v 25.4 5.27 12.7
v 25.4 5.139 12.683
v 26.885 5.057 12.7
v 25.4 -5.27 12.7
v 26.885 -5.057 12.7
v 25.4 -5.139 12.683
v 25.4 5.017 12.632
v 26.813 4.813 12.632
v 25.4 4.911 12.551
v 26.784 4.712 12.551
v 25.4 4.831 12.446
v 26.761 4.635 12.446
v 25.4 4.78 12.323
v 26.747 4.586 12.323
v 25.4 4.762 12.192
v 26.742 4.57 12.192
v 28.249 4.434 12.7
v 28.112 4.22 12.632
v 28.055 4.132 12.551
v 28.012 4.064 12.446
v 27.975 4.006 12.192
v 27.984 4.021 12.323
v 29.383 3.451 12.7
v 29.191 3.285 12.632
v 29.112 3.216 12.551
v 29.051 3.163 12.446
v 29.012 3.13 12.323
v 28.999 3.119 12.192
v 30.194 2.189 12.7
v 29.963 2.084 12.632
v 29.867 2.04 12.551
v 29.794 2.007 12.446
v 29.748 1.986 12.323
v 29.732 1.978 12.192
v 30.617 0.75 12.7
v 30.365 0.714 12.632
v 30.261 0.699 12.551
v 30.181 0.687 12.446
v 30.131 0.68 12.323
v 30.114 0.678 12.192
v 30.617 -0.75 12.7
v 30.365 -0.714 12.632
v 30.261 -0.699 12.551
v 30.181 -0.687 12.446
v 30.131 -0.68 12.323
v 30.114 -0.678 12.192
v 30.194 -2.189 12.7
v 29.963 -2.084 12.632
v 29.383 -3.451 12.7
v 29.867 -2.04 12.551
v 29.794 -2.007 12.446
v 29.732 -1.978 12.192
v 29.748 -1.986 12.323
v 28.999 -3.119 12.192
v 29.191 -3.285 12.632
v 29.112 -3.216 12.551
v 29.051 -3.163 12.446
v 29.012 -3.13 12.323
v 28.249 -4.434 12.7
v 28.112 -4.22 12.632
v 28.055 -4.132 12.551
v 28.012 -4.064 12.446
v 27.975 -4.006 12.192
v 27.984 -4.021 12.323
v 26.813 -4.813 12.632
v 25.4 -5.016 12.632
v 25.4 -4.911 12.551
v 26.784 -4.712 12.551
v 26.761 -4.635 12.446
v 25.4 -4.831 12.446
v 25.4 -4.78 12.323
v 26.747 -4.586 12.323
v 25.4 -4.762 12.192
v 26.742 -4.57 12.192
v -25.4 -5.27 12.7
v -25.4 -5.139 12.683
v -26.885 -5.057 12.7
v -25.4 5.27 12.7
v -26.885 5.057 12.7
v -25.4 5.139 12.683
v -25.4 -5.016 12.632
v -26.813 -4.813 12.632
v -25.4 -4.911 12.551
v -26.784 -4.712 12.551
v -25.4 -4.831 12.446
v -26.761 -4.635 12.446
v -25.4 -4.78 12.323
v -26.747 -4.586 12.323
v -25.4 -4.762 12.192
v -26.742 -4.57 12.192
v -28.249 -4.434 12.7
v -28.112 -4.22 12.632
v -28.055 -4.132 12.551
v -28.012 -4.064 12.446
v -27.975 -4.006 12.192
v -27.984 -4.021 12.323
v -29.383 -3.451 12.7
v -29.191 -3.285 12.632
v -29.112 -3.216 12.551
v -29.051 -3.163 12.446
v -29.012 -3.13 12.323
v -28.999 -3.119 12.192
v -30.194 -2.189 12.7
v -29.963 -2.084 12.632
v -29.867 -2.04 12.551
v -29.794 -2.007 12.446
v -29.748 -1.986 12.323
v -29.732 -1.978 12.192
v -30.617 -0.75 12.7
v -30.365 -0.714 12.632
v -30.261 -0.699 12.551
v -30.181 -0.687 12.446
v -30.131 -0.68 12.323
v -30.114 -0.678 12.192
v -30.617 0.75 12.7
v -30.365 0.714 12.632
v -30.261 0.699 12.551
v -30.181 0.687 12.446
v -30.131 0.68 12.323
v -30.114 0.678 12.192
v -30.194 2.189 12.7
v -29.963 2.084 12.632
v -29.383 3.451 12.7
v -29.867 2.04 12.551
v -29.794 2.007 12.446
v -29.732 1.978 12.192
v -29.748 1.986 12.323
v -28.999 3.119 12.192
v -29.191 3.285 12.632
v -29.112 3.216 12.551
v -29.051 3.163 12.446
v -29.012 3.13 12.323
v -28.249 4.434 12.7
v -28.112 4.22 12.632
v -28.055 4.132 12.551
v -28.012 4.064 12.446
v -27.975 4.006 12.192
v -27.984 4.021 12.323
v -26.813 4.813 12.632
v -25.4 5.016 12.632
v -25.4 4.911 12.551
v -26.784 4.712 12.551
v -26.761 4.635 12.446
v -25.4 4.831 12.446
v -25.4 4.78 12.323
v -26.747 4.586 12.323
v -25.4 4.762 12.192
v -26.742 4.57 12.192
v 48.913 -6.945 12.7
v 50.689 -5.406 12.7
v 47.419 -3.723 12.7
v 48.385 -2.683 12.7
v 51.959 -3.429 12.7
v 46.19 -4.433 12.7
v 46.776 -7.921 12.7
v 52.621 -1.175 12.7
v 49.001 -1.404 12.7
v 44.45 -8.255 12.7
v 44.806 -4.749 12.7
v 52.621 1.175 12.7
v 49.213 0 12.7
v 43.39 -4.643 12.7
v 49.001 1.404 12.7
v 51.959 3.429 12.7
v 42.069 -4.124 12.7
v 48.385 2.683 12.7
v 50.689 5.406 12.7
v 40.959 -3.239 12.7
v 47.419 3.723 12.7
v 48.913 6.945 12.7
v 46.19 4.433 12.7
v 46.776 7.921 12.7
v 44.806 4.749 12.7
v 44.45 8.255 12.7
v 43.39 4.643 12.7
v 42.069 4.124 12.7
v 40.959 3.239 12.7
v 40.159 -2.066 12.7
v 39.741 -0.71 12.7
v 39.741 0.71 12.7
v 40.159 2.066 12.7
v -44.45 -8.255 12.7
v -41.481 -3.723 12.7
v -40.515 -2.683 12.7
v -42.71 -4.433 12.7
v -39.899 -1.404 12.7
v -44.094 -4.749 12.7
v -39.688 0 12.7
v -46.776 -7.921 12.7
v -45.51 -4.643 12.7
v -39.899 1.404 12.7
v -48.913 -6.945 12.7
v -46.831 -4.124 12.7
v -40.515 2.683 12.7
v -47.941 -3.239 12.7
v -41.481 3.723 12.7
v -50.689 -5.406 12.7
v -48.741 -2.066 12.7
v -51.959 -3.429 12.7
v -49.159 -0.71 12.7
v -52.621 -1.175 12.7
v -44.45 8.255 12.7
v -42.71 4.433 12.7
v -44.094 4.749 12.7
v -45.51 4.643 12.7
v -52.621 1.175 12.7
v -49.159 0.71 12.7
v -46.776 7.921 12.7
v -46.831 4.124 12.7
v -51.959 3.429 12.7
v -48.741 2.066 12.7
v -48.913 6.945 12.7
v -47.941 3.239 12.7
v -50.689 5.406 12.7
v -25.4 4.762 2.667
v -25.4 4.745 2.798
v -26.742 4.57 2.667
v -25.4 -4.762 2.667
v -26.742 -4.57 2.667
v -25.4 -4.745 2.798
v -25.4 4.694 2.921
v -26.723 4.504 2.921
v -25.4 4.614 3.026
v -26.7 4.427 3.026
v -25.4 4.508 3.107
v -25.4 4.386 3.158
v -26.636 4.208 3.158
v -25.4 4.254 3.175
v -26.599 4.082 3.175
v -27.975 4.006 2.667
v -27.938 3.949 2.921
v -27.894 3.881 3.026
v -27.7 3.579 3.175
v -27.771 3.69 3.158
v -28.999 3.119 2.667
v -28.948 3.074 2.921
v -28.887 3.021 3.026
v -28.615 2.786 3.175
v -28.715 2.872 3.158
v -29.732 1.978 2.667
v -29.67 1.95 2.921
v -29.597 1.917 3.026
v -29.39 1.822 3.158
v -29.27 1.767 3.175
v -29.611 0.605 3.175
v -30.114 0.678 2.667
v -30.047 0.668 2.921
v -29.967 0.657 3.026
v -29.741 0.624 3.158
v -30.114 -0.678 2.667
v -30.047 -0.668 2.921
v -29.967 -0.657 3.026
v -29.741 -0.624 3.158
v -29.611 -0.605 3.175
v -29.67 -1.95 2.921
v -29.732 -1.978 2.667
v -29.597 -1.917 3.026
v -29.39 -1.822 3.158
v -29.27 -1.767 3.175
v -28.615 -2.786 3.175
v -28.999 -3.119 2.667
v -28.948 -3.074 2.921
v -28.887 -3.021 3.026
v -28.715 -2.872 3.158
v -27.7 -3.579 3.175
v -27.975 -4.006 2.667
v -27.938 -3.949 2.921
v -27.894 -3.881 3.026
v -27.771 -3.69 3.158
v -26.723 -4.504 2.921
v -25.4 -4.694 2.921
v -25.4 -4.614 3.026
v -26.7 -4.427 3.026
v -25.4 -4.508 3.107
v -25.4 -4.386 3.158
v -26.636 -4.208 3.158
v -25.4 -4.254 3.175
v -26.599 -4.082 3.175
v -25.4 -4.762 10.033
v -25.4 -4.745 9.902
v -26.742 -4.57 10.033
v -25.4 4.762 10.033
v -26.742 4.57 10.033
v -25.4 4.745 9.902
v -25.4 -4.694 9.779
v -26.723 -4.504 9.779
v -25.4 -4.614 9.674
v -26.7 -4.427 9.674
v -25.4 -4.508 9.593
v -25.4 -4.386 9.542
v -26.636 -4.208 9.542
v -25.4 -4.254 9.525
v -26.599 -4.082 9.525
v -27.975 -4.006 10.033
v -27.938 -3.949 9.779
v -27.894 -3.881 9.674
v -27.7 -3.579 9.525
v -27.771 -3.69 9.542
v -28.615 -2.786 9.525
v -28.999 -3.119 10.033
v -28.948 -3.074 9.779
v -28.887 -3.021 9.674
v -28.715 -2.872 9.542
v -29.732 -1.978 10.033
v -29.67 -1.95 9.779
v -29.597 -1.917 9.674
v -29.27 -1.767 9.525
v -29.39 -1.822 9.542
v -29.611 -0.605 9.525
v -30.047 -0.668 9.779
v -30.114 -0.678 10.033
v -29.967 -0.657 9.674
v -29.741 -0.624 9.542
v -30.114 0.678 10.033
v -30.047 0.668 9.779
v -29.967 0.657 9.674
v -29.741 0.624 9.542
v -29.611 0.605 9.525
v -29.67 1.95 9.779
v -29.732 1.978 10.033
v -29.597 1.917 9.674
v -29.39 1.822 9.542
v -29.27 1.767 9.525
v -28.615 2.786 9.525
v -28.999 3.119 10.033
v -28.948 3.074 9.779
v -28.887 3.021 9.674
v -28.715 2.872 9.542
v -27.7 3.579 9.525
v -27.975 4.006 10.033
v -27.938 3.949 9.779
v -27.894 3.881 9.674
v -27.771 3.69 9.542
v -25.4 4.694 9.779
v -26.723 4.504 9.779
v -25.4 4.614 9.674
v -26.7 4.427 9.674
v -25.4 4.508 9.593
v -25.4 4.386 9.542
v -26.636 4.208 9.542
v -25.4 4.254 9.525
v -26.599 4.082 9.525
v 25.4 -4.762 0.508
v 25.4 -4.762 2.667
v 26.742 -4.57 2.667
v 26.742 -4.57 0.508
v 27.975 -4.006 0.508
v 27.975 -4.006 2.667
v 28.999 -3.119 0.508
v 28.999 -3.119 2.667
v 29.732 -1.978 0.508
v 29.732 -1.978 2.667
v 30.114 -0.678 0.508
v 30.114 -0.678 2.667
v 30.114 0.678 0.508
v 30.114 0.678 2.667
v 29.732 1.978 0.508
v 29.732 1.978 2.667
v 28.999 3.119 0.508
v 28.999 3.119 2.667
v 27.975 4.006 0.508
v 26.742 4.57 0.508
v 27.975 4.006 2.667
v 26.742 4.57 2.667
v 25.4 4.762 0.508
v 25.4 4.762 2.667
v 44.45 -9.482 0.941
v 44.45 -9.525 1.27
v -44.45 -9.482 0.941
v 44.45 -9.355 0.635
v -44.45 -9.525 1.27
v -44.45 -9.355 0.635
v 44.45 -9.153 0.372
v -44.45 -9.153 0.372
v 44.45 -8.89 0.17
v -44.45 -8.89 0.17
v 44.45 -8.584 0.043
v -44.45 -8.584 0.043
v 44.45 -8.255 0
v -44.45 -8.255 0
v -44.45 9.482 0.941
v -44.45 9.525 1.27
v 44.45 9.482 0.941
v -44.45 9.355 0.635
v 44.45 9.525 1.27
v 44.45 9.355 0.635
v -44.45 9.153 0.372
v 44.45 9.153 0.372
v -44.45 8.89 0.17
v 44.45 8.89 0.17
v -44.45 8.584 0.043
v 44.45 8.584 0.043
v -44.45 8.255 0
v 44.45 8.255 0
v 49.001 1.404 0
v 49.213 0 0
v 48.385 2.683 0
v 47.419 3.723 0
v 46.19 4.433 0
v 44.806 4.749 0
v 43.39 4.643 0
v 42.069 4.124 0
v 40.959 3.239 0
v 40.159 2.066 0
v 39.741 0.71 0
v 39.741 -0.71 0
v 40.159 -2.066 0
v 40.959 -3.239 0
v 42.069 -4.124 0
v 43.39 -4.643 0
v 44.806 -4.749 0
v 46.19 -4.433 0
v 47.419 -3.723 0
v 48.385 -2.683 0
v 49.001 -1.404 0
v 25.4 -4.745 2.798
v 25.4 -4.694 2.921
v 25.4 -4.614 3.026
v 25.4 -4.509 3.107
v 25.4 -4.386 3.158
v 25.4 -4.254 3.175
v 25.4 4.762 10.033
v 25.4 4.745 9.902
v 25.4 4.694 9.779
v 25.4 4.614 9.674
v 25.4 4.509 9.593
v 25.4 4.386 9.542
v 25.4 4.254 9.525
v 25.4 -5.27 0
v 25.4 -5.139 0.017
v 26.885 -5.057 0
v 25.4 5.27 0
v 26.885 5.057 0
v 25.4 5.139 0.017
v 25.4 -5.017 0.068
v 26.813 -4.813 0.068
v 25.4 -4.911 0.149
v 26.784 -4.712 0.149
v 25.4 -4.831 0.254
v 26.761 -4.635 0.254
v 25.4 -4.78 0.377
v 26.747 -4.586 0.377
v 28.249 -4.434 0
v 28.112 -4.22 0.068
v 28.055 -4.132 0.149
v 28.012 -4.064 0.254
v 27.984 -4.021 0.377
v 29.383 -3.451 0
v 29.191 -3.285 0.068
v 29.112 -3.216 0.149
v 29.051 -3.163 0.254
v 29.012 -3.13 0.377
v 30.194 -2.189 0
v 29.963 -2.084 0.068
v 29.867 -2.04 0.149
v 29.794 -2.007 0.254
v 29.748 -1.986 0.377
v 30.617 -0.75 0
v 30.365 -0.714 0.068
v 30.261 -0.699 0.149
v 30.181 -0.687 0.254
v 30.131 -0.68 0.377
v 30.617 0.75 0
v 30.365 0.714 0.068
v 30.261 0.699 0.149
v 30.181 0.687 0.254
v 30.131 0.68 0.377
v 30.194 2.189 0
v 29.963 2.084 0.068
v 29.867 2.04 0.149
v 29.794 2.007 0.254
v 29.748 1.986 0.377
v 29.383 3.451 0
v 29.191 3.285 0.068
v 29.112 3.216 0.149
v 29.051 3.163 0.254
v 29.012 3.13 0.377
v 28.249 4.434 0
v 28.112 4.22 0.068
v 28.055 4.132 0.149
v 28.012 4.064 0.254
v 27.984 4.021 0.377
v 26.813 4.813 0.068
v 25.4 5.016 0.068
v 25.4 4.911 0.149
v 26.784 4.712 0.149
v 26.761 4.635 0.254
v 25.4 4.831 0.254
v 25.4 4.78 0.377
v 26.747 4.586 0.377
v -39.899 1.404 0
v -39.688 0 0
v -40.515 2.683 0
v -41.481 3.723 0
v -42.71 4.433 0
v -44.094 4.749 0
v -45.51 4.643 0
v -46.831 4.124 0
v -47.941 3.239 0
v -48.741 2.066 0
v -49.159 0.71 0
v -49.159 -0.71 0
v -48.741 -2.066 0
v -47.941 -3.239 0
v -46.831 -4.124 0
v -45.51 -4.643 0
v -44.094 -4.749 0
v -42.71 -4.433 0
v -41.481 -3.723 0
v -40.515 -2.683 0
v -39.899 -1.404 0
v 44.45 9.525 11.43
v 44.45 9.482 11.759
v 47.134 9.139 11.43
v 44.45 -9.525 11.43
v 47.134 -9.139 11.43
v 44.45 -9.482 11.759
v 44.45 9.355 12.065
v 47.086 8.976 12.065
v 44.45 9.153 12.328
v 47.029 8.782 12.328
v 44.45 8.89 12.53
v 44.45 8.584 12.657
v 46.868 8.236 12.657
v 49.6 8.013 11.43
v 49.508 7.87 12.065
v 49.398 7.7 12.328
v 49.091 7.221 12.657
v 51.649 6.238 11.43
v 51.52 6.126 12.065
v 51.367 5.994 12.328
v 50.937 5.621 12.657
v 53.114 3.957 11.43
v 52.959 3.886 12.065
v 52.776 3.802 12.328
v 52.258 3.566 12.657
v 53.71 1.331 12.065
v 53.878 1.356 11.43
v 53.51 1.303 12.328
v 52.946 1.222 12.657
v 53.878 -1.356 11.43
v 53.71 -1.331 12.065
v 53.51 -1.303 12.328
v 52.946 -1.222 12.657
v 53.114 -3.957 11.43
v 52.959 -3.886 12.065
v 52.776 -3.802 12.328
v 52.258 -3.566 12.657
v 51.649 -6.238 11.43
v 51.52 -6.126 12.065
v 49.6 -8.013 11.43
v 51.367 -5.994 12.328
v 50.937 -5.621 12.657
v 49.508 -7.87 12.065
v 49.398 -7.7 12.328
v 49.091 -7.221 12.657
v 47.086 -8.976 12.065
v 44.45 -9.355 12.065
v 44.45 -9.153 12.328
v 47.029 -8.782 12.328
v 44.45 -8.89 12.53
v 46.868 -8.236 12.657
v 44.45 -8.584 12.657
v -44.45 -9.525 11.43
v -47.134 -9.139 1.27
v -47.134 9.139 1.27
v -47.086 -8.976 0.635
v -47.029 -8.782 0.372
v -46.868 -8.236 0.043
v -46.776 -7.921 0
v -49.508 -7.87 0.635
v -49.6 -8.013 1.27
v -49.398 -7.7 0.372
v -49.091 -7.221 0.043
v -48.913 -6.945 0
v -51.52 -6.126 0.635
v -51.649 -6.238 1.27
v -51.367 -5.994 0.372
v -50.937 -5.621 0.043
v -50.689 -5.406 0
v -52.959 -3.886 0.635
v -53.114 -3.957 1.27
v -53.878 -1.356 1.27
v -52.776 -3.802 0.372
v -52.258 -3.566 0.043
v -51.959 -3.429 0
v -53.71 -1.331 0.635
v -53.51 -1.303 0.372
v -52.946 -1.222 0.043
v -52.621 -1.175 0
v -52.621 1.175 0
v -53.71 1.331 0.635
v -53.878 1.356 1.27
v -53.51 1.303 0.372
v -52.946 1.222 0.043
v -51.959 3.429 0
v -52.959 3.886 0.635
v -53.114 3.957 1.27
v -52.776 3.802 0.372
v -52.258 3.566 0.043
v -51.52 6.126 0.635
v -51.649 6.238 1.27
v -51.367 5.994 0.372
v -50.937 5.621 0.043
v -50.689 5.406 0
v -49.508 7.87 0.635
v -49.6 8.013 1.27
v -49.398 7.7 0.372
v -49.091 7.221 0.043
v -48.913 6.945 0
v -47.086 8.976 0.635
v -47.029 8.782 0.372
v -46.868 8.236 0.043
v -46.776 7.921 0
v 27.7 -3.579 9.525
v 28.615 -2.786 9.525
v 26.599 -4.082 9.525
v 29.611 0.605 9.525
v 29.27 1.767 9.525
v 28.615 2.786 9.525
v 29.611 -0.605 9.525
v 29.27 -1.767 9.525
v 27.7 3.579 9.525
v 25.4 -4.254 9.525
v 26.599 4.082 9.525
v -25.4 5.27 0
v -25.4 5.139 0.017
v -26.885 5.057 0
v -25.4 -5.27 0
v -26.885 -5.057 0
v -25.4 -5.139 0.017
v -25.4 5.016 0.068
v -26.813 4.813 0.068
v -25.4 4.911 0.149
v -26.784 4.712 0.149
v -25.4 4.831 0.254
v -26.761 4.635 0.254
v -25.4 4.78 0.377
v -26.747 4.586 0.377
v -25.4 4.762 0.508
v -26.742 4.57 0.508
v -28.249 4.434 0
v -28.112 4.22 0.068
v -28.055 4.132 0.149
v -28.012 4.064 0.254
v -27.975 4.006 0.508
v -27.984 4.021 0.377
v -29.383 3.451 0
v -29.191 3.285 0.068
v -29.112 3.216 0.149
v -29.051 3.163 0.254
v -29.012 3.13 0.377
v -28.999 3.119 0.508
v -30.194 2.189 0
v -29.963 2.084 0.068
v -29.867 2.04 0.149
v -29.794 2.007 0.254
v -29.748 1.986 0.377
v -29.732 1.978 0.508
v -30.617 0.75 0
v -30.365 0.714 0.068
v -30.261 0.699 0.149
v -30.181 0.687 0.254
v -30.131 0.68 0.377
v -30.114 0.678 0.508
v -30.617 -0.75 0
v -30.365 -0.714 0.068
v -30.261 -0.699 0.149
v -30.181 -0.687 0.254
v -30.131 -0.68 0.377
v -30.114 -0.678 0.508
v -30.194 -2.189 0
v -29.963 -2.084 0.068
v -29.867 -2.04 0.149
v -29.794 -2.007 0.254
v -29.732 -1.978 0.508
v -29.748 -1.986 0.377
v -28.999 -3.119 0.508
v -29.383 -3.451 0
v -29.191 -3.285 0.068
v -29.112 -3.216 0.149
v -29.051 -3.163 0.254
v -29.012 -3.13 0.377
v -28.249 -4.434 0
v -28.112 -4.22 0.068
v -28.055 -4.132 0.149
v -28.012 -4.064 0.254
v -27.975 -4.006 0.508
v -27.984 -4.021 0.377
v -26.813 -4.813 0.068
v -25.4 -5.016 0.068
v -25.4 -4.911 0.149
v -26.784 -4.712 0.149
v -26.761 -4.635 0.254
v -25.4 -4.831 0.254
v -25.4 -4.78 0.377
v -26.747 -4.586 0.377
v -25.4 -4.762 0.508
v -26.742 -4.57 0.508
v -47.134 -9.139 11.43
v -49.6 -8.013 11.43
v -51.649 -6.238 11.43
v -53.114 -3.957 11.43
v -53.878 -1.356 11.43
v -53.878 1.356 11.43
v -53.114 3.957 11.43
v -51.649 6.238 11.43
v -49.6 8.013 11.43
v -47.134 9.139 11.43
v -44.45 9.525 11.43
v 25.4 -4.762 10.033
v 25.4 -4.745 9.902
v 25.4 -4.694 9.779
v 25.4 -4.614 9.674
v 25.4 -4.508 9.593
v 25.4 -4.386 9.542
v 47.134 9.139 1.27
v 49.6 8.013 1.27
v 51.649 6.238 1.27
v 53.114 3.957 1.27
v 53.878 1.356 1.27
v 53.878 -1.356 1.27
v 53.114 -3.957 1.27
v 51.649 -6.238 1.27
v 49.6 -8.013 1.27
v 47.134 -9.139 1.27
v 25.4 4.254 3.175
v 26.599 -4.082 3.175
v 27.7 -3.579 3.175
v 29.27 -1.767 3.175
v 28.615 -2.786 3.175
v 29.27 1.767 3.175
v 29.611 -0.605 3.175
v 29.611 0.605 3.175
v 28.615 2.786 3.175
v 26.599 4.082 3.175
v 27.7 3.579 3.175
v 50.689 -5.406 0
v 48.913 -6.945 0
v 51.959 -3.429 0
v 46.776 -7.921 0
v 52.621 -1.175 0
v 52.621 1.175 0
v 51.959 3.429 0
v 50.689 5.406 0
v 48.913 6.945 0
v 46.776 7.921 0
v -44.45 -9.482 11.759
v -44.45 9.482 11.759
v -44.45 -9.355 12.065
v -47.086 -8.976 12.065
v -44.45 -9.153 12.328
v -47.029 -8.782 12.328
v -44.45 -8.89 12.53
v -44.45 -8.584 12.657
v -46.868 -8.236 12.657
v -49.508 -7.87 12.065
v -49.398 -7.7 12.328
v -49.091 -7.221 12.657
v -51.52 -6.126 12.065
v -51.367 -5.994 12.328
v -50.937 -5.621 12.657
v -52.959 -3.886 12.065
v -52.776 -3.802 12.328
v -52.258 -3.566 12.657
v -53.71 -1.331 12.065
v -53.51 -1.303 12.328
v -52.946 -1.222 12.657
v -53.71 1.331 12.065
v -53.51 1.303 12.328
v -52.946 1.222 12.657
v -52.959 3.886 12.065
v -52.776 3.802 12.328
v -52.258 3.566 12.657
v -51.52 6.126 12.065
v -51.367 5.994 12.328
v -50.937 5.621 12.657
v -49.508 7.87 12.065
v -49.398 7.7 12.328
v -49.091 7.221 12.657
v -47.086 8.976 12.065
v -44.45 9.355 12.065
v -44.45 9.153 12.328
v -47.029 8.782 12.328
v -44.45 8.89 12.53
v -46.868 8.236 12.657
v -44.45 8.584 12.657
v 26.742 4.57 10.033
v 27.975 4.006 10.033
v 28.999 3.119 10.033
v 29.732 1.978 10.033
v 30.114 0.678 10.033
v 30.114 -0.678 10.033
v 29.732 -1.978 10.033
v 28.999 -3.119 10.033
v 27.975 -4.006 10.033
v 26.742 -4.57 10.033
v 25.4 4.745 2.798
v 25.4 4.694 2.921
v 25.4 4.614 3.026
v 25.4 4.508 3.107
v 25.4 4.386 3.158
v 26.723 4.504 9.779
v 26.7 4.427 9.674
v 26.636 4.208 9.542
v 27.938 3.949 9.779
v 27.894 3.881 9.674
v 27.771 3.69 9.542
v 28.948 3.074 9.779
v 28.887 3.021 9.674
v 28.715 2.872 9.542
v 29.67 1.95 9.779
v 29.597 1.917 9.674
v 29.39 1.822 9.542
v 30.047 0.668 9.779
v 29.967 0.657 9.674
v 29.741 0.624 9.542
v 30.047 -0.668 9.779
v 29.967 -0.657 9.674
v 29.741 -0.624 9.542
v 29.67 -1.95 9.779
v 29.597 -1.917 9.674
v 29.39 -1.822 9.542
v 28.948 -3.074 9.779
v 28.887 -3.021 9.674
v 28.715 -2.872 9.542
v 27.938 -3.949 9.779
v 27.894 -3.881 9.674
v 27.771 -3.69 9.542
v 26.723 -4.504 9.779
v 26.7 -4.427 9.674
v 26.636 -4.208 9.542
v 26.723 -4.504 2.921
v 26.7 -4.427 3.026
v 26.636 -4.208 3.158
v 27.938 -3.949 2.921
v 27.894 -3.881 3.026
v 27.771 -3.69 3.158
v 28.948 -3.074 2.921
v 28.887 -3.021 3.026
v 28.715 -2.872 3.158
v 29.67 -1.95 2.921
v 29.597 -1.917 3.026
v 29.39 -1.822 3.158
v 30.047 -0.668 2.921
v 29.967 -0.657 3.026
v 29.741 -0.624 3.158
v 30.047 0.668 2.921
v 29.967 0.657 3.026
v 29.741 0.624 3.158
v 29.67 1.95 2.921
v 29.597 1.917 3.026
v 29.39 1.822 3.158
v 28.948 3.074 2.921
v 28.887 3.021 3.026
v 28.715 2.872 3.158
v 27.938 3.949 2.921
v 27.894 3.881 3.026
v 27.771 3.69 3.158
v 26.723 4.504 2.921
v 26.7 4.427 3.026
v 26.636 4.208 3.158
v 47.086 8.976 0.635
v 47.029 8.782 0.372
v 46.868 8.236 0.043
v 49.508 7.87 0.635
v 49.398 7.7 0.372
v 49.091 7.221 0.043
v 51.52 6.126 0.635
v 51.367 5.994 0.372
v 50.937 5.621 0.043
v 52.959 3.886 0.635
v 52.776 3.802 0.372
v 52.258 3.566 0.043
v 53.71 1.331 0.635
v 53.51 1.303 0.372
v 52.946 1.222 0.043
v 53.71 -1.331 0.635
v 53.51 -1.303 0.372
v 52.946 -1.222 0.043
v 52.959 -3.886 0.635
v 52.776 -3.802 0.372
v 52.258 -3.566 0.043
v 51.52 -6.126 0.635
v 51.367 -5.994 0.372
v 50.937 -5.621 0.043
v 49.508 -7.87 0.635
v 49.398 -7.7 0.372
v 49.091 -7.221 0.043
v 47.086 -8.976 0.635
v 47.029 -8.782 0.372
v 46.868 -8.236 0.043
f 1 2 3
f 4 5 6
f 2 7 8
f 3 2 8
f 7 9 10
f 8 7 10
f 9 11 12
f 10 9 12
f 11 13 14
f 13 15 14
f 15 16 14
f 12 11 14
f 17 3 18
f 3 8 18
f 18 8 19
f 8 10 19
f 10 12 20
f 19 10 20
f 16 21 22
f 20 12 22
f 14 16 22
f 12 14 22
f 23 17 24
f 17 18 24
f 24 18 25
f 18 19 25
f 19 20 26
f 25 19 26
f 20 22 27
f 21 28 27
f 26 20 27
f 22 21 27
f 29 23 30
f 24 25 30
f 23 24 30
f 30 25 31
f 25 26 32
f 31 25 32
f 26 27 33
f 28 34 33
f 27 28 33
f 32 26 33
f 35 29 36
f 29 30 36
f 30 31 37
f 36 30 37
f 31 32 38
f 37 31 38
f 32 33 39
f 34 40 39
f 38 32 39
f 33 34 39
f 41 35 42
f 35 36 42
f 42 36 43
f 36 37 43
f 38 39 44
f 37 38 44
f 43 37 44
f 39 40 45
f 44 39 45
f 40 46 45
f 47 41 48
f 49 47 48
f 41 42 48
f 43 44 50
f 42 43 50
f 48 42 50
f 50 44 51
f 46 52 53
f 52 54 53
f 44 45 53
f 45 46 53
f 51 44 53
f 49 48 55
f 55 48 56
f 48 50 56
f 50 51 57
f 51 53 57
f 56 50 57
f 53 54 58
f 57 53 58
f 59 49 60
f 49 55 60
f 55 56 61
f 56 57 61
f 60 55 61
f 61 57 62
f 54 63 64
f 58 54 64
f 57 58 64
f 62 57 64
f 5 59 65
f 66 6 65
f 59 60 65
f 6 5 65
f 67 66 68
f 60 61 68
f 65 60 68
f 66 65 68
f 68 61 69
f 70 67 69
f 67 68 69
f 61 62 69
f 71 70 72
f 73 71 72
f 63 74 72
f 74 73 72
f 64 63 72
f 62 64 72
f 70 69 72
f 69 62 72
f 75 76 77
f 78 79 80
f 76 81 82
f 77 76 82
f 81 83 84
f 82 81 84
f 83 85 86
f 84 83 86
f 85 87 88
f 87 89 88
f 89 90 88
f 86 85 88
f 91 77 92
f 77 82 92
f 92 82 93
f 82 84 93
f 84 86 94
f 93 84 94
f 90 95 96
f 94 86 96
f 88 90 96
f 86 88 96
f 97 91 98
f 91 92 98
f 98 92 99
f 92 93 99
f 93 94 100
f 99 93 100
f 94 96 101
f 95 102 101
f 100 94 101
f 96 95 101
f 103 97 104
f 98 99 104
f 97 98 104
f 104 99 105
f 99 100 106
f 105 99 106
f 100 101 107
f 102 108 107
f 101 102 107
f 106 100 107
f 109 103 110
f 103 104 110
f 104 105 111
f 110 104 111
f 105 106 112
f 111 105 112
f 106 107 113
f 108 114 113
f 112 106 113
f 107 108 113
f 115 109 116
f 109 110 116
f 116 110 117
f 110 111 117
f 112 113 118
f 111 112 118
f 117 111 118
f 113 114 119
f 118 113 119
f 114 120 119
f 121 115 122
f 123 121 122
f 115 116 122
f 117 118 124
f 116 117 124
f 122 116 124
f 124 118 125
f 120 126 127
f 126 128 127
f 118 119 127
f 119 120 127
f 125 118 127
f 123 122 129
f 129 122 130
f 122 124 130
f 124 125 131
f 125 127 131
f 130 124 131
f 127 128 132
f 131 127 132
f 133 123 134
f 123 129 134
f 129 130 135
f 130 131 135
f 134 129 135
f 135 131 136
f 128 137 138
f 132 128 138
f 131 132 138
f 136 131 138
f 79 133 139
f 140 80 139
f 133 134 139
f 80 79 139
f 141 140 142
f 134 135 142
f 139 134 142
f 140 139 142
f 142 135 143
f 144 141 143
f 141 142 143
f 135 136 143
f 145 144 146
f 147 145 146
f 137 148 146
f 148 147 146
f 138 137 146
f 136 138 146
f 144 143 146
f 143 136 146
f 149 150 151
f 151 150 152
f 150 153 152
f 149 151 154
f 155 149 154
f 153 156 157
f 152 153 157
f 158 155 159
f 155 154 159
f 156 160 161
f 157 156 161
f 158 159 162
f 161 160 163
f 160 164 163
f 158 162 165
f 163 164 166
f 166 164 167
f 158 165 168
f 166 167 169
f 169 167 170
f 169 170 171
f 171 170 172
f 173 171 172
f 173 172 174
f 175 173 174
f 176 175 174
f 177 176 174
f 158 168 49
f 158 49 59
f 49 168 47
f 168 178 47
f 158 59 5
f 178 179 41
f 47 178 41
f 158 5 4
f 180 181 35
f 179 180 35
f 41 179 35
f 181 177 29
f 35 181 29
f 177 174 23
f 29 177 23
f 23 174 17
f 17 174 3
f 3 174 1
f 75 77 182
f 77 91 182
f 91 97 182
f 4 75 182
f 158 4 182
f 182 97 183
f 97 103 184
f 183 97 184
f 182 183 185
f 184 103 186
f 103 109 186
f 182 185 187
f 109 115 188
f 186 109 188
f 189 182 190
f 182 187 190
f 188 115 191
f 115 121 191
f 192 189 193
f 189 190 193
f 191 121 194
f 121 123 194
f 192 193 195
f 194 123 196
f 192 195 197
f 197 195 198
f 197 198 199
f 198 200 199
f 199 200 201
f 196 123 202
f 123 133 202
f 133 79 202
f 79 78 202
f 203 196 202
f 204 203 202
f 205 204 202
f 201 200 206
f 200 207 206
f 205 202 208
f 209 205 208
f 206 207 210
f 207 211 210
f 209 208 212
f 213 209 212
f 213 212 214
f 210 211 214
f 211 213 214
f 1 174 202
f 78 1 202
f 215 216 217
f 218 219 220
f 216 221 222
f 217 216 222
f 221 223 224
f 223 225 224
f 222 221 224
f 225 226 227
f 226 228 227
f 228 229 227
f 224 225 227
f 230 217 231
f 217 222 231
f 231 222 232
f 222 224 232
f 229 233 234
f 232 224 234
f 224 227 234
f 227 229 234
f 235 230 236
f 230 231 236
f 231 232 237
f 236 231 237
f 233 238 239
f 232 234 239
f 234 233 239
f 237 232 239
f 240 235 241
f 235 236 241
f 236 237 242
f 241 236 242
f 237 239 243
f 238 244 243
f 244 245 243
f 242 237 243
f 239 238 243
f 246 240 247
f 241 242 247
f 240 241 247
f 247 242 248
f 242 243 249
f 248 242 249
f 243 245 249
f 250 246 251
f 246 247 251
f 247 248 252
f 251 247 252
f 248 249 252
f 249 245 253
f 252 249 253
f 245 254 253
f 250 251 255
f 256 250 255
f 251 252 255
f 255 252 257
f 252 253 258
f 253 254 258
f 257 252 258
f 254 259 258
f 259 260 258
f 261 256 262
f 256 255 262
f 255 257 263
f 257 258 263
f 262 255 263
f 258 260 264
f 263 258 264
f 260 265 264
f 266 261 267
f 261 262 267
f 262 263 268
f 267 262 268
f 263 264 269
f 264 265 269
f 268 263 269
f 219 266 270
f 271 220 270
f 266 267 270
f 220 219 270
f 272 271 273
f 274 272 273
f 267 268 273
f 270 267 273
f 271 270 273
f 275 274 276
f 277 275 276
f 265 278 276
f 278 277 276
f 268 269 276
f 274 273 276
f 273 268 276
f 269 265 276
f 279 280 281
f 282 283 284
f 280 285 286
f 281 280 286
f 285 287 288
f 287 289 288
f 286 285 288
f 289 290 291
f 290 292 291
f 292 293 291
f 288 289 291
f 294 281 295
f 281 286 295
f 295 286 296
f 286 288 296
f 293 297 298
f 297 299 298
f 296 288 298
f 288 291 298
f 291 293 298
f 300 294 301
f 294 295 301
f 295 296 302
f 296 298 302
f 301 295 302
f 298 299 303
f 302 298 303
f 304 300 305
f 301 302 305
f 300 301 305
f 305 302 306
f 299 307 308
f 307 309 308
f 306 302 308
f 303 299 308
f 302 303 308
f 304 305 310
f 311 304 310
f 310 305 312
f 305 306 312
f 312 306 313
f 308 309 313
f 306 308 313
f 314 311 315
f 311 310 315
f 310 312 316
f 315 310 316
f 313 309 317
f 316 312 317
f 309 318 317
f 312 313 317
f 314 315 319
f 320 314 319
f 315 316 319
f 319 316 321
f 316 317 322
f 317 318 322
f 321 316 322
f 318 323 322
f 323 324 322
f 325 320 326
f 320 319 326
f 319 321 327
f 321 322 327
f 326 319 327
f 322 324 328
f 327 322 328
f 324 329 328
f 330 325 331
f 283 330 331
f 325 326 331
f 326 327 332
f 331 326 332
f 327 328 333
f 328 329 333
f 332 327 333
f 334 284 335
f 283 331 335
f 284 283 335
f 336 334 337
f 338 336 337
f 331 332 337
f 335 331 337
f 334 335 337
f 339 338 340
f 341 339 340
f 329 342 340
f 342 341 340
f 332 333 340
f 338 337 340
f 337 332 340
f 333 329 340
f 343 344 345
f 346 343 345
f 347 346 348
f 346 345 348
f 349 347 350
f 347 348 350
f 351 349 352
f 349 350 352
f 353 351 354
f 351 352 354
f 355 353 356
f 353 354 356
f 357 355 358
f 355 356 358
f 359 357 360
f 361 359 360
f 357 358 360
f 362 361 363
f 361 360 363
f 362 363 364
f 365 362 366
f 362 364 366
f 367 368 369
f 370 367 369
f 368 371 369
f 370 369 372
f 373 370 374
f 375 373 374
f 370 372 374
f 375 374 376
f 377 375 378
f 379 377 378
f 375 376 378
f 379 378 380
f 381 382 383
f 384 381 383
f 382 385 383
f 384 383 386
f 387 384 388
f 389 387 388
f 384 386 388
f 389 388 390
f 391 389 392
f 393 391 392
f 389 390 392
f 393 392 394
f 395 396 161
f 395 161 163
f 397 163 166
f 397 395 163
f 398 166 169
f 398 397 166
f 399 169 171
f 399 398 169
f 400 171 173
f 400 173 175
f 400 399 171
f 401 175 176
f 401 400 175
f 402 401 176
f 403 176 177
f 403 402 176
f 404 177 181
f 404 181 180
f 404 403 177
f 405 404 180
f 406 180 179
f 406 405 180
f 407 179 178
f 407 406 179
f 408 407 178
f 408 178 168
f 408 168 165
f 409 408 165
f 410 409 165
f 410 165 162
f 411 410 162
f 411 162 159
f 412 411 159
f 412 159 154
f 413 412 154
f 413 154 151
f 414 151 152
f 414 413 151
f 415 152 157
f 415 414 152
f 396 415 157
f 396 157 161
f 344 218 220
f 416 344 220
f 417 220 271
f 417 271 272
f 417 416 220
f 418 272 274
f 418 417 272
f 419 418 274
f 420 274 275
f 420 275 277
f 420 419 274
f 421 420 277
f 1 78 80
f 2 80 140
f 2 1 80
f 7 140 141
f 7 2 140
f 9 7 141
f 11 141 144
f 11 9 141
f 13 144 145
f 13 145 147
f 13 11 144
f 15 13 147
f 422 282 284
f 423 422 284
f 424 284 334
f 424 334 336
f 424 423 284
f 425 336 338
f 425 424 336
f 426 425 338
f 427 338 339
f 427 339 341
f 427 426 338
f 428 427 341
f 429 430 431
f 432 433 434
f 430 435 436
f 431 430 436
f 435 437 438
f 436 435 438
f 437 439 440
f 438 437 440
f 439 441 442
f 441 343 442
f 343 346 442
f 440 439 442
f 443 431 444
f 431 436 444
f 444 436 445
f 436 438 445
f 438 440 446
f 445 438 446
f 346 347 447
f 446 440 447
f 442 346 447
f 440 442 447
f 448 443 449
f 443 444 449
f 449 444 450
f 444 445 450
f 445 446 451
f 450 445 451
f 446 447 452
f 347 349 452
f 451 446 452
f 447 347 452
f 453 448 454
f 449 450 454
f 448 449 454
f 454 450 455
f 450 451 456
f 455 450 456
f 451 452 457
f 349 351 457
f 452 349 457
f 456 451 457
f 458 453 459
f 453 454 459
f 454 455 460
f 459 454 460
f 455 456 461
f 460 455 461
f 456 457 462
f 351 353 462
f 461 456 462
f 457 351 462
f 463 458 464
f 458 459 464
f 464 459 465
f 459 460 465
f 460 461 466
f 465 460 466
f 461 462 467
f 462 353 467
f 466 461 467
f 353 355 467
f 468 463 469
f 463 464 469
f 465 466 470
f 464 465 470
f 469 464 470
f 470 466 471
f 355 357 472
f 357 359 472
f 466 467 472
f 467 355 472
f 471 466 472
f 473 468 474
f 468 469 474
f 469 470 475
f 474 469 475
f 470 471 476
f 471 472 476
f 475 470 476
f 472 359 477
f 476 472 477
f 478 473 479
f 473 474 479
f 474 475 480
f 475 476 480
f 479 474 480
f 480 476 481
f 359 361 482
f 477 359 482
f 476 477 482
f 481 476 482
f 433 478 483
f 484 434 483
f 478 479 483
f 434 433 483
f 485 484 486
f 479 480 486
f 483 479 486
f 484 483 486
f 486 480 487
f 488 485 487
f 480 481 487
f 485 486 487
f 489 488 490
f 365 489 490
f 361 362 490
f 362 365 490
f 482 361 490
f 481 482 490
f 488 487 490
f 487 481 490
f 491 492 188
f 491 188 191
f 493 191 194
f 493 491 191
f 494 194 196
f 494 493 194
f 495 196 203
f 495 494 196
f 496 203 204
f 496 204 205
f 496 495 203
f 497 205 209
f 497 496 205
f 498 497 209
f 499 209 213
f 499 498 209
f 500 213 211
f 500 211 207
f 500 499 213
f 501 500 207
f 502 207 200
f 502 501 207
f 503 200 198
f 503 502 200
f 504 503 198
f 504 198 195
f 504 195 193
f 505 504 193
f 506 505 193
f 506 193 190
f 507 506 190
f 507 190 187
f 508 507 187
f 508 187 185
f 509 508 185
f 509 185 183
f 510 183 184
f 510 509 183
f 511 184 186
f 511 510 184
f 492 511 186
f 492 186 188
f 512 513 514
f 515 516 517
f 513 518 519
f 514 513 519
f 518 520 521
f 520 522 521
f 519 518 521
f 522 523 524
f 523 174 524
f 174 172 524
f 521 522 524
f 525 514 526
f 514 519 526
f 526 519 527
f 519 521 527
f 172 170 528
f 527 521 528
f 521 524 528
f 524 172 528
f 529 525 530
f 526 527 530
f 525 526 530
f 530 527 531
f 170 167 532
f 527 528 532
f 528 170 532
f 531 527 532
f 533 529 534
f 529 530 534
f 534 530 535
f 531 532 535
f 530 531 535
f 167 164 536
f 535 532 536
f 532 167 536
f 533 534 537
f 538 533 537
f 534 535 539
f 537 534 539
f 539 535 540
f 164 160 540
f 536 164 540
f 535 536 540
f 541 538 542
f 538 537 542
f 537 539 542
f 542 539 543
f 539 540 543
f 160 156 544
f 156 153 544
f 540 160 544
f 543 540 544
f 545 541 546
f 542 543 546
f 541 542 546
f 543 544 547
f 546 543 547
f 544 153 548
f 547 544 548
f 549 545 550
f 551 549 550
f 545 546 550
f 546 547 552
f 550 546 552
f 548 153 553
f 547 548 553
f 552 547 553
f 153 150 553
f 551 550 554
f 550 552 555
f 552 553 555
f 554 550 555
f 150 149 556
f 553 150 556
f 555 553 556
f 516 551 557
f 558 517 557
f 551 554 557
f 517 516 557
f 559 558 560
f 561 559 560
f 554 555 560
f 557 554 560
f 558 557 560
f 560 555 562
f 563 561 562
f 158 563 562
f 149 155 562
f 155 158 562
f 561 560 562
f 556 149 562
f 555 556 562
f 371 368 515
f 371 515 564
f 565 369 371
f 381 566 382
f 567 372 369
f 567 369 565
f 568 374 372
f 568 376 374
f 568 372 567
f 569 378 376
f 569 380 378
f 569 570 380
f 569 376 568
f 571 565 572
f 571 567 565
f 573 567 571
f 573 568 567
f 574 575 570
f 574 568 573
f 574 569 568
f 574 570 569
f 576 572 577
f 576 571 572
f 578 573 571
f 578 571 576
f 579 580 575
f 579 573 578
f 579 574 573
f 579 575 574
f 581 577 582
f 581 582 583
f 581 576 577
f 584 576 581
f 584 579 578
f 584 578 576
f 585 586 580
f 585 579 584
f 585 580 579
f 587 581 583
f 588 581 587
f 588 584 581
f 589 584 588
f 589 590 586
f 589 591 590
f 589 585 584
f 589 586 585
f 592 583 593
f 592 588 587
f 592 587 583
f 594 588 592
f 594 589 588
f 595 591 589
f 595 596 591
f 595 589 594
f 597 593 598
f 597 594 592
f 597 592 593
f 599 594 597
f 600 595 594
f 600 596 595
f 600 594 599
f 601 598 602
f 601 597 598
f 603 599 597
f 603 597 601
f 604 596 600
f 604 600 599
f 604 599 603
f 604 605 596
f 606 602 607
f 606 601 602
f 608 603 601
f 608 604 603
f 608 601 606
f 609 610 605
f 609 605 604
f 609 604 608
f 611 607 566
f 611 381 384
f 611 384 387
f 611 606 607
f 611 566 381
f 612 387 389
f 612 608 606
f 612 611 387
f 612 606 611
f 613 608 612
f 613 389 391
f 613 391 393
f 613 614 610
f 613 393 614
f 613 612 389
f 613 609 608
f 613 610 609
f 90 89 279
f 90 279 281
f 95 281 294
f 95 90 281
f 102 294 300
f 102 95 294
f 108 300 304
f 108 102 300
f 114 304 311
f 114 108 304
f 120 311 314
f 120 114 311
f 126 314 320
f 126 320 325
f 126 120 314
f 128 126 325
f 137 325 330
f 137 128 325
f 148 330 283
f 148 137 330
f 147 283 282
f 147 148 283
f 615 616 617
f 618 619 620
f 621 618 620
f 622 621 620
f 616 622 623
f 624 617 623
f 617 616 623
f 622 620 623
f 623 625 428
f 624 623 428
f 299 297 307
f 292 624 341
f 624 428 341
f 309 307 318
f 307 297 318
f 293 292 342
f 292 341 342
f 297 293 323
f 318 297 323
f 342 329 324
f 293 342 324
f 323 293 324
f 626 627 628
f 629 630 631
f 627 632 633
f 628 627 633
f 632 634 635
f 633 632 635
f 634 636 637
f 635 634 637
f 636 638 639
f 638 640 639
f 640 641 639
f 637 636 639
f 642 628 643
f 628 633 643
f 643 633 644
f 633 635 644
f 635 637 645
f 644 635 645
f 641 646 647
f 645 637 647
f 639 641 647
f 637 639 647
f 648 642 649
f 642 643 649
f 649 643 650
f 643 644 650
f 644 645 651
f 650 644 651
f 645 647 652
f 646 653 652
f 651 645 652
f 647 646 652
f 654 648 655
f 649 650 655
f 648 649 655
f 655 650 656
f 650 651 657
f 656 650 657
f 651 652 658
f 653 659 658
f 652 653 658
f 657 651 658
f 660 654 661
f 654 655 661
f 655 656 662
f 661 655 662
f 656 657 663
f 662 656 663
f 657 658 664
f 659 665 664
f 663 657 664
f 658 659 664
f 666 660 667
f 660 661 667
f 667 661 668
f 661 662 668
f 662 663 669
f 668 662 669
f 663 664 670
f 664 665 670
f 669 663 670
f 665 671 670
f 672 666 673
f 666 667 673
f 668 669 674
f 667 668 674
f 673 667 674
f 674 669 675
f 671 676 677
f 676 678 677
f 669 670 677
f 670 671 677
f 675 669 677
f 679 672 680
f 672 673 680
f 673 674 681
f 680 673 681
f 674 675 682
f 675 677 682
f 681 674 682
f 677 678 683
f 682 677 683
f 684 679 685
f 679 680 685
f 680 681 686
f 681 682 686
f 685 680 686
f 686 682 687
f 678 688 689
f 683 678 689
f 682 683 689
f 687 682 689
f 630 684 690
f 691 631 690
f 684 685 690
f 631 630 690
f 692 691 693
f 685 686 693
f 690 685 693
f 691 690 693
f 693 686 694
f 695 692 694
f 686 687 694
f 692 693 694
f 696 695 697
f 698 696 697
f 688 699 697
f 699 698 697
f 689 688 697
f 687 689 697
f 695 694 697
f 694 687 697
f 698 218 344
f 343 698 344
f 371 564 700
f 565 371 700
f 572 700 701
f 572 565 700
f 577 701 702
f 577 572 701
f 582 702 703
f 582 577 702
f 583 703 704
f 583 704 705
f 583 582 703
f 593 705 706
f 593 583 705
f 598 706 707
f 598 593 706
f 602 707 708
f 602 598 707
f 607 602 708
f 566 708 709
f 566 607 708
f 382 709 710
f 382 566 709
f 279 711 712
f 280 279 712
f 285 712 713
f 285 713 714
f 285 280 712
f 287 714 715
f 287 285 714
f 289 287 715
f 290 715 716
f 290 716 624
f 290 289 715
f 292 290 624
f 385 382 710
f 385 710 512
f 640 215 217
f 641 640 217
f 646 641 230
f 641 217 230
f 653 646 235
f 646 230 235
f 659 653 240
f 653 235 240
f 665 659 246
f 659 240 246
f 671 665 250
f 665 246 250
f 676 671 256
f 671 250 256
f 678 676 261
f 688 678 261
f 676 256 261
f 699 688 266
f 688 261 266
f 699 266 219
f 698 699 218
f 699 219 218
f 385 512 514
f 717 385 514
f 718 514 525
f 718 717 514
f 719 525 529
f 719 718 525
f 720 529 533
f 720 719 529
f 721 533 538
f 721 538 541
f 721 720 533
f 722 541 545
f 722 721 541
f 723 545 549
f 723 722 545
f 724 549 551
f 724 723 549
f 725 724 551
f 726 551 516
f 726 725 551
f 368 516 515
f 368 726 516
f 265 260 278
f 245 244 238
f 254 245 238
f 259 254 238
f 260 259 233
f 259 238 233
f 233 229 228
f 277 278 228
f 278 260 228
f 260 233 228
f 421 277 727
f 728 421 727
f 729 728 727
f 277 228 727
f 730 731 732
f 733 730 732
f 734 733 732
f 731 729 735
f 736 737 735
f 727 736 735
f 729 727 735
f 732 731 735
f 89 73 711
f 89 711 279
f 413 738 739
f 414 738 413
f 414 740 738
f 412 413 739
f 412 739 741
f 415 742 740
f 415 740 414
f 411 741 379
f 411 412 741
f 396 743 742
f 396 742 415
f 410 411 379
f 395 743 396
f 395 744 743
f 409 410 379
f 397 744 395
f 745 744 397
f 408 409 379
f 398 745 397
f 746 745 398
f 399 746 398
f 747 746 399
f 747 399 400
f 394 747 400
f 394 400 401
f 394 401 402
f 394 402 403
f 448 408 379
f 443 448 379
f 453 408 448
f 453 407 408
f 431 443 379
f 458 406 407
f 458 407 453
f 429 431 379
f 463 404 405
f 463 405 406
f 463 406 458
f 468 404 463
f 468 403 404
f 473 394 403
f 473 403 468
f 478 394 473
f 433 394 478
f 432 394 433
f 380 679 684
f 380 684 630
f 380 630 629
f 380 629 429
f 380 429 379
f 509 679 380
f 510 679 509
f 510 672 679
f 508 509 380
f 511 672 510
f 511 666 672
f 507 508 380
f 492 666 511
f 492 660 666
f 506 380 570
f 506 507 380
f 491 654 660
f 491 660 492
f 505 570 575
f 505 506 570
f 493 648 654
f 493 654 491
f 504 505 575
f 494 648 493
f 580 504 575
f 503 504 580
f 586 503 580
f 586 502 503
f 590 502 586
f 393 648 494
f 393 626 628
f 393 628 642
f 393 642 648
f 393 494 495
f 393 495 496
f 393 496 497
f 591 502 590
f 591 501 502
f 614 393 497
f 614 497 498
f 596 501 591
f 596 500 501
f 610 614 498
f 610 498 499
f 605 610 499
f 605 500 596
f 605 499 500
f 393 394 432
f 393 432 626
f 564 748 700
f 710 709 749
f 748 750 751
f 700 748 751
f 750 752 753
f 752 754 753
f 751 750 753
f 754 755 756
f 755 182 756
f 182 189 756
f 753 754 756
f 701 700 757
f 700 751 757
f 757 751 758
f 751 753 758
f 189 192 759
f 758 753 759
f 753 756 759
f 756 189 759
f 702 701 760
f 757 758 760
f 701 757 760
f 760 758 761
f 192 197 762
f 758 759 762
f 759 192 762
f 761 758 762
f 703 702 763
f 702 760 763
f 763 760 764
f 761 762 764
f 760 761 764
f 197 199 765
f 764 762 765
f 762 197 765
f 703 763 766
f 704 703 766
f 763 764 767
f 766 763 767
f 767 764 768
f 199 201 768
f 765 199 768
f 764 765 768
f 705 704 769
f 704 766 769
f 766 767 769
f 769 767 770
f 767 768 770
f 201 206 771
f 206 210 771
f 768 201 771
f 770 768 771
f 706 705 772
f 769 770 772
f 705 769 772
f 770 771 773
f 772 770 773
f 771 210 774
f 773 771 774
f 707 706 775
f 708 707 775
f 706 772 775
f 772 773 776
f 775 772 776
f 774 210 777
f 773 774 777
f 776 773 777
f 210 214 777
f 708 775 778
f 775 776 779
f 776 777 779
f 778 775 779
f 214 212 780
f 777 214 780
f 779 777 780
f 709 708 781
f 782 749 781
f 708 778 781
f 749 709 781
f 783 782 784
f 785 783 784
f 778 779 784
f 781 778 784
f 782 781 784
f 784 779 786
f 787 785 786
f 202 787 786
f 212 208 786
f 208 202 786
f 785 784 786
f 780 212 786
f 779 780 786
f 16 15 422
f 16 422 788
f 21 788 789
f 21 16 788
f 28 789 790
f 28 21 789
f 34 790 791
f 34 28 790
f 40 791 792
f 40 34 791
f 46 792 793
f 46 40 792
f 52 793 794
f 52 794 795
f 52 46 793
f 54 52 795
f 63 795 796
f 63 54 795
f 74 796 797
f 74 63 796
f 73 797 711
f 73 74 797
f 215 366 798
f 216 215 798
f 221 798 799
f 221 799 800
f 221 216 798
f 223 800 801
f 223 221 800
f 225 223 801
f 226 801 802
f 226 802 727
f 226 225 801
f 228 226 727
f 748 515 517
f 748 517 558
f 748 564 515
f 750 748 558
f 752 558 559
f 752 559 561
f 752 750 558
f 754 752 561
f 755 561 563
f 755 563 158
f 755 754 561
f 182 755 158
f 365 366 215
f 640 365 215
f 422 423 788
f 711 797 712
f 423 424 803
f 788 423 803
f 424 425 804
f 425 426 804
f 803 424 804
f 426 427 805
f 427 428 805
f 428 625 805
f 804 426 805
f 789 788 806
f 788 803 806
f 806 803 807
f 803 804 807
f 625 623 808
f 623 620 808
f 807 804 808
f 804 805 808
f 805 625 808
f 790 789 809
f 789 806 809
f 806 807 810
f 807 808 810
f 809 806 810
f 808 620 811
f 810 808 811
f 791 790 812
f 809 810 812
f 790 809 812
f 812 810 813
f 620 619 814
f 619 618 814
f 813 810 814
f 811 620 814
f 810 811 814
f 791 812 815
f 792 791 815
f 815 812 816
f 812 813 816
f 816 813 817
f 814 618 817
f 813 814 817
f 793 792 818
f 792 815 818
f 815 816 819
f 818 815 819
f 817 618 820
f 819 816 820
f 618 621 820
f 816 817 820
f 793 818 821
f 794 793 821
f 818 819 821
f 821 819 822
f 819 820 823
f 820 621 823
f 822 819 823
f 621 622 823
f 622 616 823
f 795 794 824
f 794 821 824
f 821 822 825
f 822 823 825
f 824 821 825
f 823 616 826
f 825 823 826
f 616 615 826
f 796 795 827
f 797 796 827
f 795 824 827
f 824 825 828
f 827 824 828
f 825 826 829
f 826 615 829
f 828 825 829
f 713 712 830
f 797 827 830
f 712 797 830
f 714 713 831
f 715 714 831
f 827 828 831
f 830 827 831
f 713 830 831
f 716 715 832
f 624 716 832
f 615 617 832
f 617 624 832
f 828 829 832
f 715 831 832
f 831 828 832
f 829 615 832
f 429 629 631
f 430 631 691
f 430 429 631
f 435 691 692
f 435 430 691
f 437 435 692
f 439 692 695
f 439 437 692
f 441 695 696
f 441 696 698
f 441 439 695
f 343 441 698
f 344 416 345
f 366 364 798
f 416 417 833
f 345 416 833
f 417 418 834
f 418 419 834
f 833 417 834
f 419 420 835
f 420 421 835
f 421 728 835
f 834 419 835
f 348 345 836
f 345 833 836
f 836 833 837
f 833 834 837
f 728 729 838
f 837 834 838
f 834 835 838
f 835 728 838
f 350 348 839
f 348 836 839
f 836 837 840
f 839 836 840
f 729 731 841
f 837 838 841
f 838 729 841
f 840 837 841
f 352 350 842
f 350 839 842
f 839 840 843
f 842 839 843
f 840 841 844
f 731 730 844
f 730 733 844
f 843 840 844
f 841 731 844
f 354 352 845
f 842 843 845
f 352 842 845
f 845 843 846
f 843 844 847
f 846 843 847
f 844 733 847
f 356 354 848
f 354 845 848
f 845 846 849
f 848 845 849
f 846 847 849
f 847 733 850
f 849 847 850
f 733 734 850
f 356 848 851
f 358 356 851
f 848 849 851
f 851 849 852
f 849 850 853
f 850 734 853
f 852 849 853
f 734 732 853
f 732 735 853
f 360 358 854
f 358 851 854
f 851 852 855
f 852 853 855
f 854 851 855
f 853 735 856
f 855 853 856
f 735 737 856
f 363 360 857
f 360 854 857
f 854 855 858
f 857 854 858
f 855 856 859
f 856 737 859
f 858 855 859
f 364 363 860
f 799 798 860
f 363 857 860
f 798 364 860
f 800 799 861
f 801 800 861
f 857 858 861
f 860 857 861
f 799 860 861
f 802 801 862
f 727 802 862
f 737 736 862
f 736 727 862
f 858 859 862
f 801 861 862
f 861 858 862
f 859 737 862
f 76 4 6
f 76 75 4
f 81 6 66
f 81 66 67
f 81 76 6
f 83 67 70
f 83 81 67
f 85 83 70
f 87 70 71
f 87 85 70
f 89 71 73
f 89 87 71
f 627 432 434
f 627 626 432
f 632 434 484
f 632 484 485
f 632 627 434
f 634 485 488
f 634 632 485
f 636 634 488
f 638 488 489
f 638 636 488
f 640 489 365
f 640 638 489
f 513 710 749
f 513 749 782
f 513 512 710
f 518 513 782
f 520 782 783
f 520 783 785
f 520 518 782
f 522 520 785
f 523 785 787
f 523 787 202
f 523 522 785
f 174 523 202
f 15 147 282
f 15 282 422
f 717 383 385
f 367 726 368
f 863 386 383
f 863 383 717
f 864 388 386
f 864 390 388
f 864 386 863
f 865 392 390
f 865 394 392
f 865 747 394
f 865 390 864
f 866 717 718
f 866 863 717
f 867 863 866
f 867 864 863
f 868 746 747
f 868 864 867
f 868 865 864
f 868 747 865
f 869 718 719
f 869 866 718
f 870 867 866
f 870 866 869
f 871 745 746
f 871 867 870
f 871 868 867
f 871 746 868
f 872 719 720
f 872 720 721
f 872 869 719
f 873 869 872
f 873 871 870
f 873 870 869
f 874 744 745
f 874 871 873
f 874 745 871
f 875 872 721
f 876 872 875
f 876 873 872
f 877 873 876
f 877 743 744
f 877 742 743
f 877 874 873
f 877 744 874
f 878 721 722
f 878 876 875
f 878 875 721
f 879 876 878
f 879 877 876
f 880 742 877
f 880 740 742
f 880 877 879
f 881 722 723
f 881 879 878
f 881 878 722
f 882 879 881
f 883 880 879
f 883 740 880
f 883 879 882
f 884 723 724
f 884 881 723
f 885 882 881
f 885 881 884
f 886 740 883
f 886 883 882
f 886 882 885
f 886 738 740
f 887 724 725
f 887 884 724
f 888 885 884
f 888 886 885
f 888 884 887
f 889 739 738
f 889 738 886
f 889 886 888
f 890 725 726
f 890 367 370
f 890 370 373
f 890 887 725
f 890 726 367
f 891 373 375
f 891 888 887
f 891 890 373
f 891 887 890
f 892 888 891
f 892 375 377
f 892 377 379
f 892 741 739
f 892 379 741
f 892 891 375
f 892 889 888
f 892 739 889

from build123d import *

# Parameters (mm, degrees)
SKETCH1_R           = 4.7625
BOSS_EXTRUDE1_DEPTH = 12.7
FILLET1_R           = 1.27
CUT_EXTRUDE1_DEPTH  = 3.175
CUT_EXTRUDE2_START  = -3.175
CUT_EXTRUDE2_DEPTH  = 3.175
FILLET3_R           = 0.508


with BuildPart() as part:
    # Sketch1 → Boss-Extrude1 (new body)
    with BuildSketch(Plane.XY):
        with BuildLine():
            Line((-44.45, 9.525), (44.45, 9.525))
            ThreePointArc((44.45, 9.525), (53.975, 0), (44.45, -9.525))
            Line((44.45, -9.525), (-44.45, -9.525))
            ThreePointArc((-44.45, -9.525), (-53.975, 0), (-44.45, 9.525))
        make_face()
        with Locations((-44.45, 0)):
            Circle(SKETCH1_R, mode=Mode.SUBTRACT)
        with Locations((44.45, 0)):
            Circle(SKETCH1_R, mode=Mode.SUBTRACT)
    extrude(amount=BOSS_EXTRUDE1_DEPTH)

    # Fillet1
    fillet1_edges = [part.edges().sort_by_distance(p)[0] for p in [
        (53.975, 0, 12.7),
        (0, 9.525, 12.7),
        (-53.975, 0, 12.7),
        (0, 9.525, 0),
        (53.975, 0, 0),
        (0, -9.525, 0),
        (-53.975, 0, 0),
        (0, -9.525, 12.7),
    ]]
    fillet(fillet1_edges, radius=FILLET1_R)

    # Sketch2 → Cut-Extrude1 (cut)
    with BuildSketch(Plane.XY.offset(12.7)):
        with BuildLine():
            Line((-25.4, 4.7625), (25.4, 4.7625))
            ThreePointArc((25.4, 4.7625), (30.1625, 0), (25.4, -4.7625))
            Line((25.4, -4.7625), (-25.4, -4.7625))
            ThreePointArc((-25.4, -4.7625), (-30.1625, 0), (-25.4, 4.7625))
        make_face()
    extrude(amount=-CUT_EXTRUDE1_DEPTH, mode=Mode.SUBTRACT)

    # Sketch3 → Cut-Extrude2 (cut)
    with BuildSketch(Plane(origin=(0, 0, 0), x_dir=(-1, 0, 0), z_dir=(0, 0, -1)).offset(CUT_EXTRUDE2_START)):
        with BuildLine():
            Line((25.4, -4.7625), (-25.4, -4.7625))
            ThreePointArc((-25.4, -4.7625), (-30.1625, 0), (-25.4, 4.7625))
            Line((-25.4, 4.7625), (25.4, 4.7625))
            ThreePointArc((25.4, 4.7625), (30.1625, 0), (25.4, -4.7625))
        make_face()
    extrude(amount=CUT_EXTRUDE2_DEPTH, mode=Mode.SUBTRACT)

    # Fillet3
    fillet3_edges = [part.edges().sort_by_distance(p)[0] for p in [
        (-30.1625, 0, 9.525),
        (0, 4.7625, 9.525),
        (30.1625, 0, 9.525),
        (0, -4.7625, 9.525),
        (-30.1625, 0, 12.7),
        (0, -4.7625, 12.7),
        (30.1625, 0, 12.7),
        (0, 4.7625, 12.7),
        (-30.1625, 0, 3.175),
        (0, -4.7625, 3.175),
        (30.1625, 0, 3.175),
        (0, 4.7625, 3.175),
        (-30.1625, 0, 0),
        (0, 4.7625, 0),
        (30.1625, 0, 0),
        (0, -4.7625, 0),
    ]]
    fillet(fillet3_edges, radius=FILLET3_R)


solid = part.part
